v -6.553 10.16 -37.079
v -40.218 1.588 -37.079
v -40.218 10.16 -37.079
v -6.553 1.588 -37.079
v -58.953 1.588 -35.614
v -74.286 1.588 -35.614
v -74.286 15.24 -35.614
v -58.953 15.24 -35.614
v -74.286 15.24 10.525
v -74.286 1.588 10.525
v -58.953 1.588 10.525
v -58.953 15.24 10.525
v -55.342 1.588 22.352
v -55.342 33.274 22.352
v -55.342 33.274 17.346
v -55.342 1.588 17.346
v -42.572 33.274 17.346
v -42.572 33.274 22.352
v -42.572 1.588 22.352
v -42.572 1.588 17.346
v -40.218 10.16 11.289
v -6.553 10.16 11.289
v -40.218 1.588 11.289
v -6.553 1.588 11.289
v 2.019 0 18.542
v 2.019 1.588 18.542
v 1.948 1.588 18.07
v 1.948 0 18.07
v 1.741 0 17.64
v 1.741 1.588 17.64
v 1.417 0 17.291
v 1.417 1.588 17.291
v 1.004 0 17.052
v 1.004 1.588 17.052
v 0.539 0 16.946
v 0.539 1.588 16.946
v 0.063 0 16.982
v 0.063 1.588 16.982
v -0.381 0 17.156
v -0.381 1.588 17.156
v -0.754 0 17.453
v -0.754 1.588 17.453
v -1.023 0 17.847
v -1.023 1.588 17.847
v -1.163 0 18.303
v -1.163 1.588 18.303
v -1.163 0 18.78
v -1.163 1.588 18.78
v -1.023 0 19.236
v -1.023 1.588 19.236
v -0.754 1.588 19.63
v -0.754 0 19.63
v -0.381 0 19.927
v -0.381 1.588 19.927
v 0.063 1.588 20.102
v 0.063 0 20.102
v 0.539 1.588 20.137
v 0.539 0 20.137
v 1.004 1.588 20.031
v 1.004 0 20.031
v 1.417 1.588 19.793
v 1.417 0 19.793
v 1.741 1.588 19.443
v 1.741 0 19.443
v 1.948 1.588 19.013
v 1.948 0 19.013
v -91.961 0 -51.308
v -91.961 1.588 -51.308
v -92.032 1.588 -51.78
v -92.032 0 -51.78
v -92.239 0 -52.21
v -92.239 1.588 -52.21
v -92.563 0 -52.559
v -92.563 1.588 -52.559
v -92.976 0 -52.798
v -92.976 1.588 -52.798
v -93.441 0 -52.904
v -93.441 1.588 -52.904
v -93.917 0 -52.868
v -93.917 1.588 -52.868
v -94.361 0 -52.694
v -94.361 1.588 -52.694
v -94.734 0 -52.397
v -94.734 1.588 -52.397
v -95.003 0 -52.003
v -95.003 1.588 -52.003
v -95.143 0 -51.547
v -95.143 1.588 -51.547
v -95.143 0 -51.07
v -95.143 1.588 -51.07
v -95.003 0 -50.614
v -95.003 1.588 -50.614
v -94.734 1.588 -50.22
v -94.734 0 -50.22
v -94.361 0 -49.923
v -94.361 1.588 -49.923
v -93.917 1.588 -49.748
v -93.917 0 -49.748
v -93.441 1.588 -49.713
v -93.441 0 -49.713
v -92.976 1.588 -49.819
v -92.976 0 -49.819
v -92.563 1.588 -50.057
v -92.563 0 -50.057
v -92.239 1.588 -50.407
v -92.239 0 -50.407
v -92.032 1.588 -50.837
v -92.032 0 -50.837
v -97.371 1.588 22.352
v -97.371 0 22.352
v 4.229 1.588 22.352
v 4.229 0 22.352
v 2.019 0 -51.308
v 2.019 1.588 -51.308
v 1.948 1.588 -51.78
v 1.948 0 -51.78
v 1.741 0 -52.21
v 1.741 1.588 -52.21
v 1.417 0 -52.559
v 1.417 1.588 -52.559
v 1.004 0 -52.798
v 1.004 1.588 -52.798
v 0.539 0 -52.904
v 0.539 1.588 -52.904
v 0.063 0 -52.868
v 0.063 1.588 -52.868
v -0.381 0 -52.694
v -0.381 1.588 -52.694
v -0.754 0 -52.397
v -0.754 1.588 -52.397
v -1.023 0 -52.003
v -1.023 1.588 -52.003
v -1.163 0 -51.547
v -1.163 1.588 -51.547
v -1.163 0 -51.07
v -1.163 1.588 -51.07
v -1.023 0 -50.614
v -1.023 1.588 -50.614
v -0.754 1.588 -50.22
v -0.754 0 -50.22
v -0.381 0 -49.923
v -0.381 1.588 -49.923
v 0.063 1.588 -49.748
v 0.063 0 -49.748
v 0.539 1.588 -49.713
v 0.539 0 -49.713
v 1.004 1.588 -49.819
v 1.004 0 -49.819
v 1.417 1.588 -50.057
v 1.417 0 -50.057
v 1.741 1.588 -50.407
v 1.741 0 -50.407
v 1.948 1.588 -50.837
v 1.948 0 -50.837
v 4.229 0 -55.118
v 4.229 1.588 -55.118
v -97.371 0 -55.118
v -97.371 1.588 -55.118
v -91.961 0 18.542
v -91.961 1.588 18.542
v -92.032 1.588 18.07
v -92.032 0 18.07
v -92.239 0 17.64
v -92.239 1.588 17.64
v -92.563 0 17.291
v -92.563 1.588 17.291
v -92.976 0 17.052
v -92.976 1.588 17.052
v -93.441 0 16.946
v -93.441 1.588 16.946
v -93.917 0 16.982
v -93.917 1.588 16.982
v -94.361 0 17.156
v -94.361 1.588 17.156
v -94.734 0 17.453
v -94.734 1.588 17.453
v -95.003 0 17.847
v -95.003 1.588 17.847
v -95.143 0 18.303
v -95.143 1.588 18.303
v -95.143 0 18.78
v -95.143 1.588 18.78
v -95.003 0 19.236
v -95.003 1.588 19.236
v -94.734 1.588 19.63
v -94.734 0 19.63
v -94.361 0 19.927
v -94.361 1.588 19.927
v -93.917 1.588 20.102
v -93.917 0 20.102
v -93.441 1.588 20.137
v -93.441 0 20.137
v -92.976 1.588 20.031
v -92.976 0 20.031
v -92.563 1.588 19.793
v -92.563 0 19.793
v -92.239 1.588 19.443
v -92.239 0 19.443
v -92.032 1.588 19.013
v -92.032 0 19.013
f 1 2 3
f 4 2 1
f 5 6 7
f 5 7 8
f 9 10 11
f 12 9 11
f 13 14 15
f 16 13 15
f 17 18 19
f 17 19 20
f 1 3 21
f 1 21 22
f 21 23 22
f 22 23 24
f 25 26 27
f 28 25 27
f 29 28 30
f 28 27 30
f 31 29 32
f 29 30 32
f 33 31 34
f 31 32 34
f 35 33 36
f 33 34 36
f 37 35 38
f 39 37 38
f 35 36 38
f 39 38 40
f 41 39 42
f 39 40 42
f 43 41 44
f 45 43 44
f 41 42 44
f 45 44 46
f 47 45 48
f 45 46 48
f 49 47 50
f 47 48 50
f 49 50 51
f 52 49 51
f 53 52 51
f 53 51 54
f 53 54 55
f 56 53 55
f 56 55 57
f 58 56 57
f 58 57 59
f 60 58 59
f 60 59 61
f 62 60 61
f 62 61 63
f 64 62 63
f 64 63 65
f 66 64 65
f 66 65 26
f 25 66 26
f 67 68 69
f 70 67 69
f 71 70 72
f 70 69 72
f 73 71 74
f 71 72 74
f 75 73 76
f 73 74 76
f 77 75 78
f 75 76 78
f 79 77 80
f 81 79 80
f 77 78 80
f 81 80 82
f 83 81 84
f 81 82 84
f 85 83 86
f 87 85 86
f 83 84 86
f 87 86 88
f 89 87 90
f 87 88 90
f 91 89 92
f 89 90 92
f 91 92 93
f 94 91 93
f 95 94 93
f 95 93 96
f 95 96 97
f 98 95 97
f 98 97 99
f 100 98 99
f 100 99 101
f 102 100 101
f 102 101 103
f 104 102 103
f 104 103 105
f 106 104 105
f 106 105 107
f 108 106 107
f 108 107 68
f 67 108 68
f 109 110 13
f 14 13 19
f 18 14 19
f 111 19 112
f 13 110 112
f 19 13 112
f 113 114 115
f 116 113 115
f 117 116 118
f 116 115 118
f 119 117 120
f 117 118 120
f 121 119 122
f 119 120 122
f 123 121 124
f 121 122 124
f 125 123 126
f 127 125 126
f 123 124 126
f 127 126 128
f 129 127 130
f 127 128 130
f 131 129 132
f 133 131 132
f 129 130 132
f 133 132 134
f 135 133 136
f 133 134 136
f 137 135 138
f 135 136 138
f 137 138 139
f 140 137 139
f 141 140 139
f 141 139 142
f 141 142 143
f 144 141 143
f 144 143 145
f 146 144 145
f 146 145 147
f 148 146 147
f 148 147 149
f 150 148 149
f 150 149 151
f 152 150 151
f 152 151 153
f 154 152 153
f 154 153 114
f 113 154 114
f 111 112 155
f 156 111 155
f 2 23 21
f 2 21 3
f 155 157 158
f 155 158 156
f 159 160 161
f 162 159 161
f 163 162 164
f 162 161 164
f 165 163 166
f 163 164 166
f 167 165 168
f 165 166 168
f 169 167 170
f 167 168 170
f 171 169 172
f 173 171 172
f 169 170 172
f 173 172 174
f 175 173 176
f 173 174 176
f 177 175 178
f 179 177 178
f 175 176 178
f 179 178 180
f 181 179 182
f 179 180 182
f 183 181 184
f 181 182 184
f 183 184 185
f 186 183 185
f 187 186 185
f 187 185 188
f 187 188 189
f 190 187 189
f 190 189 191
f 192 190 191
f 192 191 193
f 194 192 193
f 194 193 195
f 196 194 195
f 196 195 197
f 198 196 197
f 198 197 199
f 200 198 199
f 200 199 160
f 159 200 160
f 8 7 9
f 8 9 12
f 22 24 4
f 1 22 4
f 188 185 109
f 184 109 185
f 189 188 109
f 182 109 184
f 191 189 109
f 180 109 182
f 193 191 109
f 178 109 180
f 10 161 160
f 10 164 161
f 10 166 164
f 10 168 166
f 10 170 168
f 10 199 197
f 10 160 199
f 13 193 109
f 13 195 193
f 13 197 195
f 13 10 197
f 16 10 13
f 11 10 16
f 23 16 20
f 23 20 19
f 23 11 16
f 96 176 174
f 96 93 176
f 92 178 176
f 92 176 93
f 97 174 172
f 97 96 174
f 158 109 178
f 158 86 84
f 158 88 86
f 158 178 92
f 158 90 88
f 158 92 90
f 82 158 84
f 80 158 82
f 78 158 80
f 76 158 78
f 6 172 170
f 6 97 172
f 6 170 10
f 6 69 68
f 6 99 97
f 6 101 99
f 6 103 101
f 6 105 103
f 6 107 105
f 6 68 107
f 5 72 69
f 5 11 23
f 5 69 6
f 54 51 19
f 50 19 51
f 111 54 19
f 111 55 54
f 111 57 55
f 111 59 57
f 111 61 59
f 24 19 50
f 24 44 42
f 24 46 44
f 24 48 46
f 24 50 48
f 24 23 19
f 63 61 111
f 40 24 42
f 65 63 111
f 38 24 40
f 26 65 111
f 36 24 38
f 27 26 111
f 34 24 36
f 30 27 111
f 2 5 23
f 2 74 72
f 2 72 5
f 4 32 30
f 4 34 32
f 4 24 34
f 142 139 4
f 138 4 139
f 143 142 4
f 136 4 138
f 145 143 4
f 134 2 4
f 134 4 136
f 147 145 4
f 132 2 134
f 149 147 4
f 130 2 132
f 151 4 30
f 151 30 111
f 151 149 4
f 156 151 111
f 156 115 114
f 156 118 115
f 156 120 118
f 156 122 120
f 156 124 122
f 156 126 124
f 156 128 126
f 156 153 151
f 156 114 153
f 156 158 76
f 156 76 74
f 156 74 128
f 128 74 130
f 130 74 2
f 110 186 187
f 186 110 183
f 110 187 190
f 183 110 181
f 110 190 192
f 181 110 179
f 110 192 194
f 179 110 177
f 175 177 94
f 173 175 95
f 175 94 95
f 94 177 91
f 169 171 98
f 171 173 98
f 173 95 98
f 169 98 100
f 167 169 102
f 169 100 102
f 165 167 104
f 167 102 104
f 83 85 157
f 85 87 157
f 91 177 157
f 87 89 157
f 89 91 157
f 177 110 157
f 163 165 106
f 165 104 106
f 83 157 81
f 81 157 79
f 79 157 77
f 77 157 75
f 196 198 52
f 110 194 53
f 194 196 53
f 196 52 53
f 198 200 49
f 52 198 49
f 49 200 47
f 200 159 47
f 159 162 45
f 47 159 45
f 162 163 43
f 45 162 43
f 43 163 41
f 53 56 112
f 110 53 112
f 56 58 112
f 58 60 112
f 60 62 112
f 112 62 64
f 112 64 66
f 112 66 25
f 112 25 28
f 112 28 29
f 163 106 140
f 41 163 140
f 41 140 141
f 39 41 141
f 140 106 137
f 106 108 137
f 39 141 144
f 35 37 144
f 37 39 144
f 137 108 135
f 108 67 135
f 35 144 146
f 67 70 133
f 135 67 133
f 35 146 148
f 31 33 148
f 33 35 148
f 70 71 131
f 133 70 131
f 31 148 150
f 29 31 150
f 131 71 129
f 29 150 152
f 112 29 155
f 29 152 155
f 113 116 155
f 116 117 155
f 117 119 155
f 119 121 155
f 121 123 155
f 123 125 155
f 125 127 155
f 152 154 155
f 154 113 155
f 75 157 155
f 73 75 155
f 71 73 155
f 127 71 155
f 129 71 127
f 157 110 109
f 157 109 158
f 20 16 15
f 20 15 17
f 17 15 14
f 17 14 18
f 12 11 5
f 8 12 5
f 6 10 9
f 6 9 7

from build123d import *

# Parameters (mm, degrees)
SKETCH1_W           = 101.6
SKETCH1_H           = 77.47
BOSS_EXTRUDE1_DEPTH = 1.5875
SKETCH2_R           = 1.6002
CUT_EXTRUDE1_DEPTH  = 2.54
SKETCH3_W           = 12.769362992
SKETCH3_H           = 5.005824016
BOSS_EXTRUDE2_DEPTH = 33.274
SKETCH4_W           = 33.664684251
SKETCH4_H           = 48.368799212
BOSS_EXTRUDE3_DEPTH = 10.16
SKETCH5_W           = 15.332321875
SKETCH5_H           = 46.138952111
BOSS_EXTRUDE4_DEPTH = 15.24


with BuildPart() as part:
    # Sketch1 → Boss-Extrude1 (new body)
    with BuildSketch(Plane(origin=(0, 0, 0), x_dir=(1, 0, 0), z_dir=(0, 1, 0))):
        with Locations((-46.570976536, 16.383405637)):
            Rectangle(SKETCH1_W, SKETCH1_H)
    extrude(amount=BOSS_EXTRUDE1_DEPTH)

    # Sketch2 → Cut-Extrude1 (cut)
    with BuildSketch(Plane(origin=(0, 1.5875, 0), x_dir=(1, 0, 0), z_dir=(0, 1, 0))):
        with Locations((-93.560976536, -18.541594363)):
            Circle(SKETCH2_R)
        with Locations((-93.560976536, 51.308405637)):
            Circle(SKETCH2_R)
        with Locations((0.419023464, 51.308405637)):
            Circle(SKETCH2_R)
        with Locations((0.419023464, -18.541594363)):
            Circle(SKETCH2_R)
    extrude(amount=-CUT_EXTRUDE1_DEPTH, mode=Mode.SUBTRACT)

    # Sketch3 → Boss-Extrude2 (add)
    with BuildSketch(Plane(origin=(0, 0, 0), x_dir=(1, 0, 0), z_dir=(0, 1, 0))):
        with Locations((-48.957170631, -19.848682355)):
            Rectangle(SKETCH3_W, SKETCH3_H)
    extrude(amount=BOSS_EXTRUDE2_DEPTH)

    # Sketch4 → Boss-Extrude3 (add)
    with BuildSketch(Plane(origin=(0, 0, 0), x_dir=(1, 0, 0), z_dir=(0, 1, 0))):
        with Locations((-23.385471389, 12.894993304)):
            Rectangle(SKETCH4_W, SKETCH4_H)
    extrude(amount=BOSS_EXTRUDE3_DEPTH)

    # Sketch5 → Boss-Extrude4 (add)
    with BuildSketch(Plane(origin=(0, 0, 0), x_dir=(1, 0, 0), z_dir=(0, 1, 0))):
        with Locations((-66.619550072, 12.54421879)):
            Rectangle(SKETCH5_W, SKETCH5_H)
    extrude(amount=BOSS_EXTRUDE4_DEPTH)


solid = part.part
